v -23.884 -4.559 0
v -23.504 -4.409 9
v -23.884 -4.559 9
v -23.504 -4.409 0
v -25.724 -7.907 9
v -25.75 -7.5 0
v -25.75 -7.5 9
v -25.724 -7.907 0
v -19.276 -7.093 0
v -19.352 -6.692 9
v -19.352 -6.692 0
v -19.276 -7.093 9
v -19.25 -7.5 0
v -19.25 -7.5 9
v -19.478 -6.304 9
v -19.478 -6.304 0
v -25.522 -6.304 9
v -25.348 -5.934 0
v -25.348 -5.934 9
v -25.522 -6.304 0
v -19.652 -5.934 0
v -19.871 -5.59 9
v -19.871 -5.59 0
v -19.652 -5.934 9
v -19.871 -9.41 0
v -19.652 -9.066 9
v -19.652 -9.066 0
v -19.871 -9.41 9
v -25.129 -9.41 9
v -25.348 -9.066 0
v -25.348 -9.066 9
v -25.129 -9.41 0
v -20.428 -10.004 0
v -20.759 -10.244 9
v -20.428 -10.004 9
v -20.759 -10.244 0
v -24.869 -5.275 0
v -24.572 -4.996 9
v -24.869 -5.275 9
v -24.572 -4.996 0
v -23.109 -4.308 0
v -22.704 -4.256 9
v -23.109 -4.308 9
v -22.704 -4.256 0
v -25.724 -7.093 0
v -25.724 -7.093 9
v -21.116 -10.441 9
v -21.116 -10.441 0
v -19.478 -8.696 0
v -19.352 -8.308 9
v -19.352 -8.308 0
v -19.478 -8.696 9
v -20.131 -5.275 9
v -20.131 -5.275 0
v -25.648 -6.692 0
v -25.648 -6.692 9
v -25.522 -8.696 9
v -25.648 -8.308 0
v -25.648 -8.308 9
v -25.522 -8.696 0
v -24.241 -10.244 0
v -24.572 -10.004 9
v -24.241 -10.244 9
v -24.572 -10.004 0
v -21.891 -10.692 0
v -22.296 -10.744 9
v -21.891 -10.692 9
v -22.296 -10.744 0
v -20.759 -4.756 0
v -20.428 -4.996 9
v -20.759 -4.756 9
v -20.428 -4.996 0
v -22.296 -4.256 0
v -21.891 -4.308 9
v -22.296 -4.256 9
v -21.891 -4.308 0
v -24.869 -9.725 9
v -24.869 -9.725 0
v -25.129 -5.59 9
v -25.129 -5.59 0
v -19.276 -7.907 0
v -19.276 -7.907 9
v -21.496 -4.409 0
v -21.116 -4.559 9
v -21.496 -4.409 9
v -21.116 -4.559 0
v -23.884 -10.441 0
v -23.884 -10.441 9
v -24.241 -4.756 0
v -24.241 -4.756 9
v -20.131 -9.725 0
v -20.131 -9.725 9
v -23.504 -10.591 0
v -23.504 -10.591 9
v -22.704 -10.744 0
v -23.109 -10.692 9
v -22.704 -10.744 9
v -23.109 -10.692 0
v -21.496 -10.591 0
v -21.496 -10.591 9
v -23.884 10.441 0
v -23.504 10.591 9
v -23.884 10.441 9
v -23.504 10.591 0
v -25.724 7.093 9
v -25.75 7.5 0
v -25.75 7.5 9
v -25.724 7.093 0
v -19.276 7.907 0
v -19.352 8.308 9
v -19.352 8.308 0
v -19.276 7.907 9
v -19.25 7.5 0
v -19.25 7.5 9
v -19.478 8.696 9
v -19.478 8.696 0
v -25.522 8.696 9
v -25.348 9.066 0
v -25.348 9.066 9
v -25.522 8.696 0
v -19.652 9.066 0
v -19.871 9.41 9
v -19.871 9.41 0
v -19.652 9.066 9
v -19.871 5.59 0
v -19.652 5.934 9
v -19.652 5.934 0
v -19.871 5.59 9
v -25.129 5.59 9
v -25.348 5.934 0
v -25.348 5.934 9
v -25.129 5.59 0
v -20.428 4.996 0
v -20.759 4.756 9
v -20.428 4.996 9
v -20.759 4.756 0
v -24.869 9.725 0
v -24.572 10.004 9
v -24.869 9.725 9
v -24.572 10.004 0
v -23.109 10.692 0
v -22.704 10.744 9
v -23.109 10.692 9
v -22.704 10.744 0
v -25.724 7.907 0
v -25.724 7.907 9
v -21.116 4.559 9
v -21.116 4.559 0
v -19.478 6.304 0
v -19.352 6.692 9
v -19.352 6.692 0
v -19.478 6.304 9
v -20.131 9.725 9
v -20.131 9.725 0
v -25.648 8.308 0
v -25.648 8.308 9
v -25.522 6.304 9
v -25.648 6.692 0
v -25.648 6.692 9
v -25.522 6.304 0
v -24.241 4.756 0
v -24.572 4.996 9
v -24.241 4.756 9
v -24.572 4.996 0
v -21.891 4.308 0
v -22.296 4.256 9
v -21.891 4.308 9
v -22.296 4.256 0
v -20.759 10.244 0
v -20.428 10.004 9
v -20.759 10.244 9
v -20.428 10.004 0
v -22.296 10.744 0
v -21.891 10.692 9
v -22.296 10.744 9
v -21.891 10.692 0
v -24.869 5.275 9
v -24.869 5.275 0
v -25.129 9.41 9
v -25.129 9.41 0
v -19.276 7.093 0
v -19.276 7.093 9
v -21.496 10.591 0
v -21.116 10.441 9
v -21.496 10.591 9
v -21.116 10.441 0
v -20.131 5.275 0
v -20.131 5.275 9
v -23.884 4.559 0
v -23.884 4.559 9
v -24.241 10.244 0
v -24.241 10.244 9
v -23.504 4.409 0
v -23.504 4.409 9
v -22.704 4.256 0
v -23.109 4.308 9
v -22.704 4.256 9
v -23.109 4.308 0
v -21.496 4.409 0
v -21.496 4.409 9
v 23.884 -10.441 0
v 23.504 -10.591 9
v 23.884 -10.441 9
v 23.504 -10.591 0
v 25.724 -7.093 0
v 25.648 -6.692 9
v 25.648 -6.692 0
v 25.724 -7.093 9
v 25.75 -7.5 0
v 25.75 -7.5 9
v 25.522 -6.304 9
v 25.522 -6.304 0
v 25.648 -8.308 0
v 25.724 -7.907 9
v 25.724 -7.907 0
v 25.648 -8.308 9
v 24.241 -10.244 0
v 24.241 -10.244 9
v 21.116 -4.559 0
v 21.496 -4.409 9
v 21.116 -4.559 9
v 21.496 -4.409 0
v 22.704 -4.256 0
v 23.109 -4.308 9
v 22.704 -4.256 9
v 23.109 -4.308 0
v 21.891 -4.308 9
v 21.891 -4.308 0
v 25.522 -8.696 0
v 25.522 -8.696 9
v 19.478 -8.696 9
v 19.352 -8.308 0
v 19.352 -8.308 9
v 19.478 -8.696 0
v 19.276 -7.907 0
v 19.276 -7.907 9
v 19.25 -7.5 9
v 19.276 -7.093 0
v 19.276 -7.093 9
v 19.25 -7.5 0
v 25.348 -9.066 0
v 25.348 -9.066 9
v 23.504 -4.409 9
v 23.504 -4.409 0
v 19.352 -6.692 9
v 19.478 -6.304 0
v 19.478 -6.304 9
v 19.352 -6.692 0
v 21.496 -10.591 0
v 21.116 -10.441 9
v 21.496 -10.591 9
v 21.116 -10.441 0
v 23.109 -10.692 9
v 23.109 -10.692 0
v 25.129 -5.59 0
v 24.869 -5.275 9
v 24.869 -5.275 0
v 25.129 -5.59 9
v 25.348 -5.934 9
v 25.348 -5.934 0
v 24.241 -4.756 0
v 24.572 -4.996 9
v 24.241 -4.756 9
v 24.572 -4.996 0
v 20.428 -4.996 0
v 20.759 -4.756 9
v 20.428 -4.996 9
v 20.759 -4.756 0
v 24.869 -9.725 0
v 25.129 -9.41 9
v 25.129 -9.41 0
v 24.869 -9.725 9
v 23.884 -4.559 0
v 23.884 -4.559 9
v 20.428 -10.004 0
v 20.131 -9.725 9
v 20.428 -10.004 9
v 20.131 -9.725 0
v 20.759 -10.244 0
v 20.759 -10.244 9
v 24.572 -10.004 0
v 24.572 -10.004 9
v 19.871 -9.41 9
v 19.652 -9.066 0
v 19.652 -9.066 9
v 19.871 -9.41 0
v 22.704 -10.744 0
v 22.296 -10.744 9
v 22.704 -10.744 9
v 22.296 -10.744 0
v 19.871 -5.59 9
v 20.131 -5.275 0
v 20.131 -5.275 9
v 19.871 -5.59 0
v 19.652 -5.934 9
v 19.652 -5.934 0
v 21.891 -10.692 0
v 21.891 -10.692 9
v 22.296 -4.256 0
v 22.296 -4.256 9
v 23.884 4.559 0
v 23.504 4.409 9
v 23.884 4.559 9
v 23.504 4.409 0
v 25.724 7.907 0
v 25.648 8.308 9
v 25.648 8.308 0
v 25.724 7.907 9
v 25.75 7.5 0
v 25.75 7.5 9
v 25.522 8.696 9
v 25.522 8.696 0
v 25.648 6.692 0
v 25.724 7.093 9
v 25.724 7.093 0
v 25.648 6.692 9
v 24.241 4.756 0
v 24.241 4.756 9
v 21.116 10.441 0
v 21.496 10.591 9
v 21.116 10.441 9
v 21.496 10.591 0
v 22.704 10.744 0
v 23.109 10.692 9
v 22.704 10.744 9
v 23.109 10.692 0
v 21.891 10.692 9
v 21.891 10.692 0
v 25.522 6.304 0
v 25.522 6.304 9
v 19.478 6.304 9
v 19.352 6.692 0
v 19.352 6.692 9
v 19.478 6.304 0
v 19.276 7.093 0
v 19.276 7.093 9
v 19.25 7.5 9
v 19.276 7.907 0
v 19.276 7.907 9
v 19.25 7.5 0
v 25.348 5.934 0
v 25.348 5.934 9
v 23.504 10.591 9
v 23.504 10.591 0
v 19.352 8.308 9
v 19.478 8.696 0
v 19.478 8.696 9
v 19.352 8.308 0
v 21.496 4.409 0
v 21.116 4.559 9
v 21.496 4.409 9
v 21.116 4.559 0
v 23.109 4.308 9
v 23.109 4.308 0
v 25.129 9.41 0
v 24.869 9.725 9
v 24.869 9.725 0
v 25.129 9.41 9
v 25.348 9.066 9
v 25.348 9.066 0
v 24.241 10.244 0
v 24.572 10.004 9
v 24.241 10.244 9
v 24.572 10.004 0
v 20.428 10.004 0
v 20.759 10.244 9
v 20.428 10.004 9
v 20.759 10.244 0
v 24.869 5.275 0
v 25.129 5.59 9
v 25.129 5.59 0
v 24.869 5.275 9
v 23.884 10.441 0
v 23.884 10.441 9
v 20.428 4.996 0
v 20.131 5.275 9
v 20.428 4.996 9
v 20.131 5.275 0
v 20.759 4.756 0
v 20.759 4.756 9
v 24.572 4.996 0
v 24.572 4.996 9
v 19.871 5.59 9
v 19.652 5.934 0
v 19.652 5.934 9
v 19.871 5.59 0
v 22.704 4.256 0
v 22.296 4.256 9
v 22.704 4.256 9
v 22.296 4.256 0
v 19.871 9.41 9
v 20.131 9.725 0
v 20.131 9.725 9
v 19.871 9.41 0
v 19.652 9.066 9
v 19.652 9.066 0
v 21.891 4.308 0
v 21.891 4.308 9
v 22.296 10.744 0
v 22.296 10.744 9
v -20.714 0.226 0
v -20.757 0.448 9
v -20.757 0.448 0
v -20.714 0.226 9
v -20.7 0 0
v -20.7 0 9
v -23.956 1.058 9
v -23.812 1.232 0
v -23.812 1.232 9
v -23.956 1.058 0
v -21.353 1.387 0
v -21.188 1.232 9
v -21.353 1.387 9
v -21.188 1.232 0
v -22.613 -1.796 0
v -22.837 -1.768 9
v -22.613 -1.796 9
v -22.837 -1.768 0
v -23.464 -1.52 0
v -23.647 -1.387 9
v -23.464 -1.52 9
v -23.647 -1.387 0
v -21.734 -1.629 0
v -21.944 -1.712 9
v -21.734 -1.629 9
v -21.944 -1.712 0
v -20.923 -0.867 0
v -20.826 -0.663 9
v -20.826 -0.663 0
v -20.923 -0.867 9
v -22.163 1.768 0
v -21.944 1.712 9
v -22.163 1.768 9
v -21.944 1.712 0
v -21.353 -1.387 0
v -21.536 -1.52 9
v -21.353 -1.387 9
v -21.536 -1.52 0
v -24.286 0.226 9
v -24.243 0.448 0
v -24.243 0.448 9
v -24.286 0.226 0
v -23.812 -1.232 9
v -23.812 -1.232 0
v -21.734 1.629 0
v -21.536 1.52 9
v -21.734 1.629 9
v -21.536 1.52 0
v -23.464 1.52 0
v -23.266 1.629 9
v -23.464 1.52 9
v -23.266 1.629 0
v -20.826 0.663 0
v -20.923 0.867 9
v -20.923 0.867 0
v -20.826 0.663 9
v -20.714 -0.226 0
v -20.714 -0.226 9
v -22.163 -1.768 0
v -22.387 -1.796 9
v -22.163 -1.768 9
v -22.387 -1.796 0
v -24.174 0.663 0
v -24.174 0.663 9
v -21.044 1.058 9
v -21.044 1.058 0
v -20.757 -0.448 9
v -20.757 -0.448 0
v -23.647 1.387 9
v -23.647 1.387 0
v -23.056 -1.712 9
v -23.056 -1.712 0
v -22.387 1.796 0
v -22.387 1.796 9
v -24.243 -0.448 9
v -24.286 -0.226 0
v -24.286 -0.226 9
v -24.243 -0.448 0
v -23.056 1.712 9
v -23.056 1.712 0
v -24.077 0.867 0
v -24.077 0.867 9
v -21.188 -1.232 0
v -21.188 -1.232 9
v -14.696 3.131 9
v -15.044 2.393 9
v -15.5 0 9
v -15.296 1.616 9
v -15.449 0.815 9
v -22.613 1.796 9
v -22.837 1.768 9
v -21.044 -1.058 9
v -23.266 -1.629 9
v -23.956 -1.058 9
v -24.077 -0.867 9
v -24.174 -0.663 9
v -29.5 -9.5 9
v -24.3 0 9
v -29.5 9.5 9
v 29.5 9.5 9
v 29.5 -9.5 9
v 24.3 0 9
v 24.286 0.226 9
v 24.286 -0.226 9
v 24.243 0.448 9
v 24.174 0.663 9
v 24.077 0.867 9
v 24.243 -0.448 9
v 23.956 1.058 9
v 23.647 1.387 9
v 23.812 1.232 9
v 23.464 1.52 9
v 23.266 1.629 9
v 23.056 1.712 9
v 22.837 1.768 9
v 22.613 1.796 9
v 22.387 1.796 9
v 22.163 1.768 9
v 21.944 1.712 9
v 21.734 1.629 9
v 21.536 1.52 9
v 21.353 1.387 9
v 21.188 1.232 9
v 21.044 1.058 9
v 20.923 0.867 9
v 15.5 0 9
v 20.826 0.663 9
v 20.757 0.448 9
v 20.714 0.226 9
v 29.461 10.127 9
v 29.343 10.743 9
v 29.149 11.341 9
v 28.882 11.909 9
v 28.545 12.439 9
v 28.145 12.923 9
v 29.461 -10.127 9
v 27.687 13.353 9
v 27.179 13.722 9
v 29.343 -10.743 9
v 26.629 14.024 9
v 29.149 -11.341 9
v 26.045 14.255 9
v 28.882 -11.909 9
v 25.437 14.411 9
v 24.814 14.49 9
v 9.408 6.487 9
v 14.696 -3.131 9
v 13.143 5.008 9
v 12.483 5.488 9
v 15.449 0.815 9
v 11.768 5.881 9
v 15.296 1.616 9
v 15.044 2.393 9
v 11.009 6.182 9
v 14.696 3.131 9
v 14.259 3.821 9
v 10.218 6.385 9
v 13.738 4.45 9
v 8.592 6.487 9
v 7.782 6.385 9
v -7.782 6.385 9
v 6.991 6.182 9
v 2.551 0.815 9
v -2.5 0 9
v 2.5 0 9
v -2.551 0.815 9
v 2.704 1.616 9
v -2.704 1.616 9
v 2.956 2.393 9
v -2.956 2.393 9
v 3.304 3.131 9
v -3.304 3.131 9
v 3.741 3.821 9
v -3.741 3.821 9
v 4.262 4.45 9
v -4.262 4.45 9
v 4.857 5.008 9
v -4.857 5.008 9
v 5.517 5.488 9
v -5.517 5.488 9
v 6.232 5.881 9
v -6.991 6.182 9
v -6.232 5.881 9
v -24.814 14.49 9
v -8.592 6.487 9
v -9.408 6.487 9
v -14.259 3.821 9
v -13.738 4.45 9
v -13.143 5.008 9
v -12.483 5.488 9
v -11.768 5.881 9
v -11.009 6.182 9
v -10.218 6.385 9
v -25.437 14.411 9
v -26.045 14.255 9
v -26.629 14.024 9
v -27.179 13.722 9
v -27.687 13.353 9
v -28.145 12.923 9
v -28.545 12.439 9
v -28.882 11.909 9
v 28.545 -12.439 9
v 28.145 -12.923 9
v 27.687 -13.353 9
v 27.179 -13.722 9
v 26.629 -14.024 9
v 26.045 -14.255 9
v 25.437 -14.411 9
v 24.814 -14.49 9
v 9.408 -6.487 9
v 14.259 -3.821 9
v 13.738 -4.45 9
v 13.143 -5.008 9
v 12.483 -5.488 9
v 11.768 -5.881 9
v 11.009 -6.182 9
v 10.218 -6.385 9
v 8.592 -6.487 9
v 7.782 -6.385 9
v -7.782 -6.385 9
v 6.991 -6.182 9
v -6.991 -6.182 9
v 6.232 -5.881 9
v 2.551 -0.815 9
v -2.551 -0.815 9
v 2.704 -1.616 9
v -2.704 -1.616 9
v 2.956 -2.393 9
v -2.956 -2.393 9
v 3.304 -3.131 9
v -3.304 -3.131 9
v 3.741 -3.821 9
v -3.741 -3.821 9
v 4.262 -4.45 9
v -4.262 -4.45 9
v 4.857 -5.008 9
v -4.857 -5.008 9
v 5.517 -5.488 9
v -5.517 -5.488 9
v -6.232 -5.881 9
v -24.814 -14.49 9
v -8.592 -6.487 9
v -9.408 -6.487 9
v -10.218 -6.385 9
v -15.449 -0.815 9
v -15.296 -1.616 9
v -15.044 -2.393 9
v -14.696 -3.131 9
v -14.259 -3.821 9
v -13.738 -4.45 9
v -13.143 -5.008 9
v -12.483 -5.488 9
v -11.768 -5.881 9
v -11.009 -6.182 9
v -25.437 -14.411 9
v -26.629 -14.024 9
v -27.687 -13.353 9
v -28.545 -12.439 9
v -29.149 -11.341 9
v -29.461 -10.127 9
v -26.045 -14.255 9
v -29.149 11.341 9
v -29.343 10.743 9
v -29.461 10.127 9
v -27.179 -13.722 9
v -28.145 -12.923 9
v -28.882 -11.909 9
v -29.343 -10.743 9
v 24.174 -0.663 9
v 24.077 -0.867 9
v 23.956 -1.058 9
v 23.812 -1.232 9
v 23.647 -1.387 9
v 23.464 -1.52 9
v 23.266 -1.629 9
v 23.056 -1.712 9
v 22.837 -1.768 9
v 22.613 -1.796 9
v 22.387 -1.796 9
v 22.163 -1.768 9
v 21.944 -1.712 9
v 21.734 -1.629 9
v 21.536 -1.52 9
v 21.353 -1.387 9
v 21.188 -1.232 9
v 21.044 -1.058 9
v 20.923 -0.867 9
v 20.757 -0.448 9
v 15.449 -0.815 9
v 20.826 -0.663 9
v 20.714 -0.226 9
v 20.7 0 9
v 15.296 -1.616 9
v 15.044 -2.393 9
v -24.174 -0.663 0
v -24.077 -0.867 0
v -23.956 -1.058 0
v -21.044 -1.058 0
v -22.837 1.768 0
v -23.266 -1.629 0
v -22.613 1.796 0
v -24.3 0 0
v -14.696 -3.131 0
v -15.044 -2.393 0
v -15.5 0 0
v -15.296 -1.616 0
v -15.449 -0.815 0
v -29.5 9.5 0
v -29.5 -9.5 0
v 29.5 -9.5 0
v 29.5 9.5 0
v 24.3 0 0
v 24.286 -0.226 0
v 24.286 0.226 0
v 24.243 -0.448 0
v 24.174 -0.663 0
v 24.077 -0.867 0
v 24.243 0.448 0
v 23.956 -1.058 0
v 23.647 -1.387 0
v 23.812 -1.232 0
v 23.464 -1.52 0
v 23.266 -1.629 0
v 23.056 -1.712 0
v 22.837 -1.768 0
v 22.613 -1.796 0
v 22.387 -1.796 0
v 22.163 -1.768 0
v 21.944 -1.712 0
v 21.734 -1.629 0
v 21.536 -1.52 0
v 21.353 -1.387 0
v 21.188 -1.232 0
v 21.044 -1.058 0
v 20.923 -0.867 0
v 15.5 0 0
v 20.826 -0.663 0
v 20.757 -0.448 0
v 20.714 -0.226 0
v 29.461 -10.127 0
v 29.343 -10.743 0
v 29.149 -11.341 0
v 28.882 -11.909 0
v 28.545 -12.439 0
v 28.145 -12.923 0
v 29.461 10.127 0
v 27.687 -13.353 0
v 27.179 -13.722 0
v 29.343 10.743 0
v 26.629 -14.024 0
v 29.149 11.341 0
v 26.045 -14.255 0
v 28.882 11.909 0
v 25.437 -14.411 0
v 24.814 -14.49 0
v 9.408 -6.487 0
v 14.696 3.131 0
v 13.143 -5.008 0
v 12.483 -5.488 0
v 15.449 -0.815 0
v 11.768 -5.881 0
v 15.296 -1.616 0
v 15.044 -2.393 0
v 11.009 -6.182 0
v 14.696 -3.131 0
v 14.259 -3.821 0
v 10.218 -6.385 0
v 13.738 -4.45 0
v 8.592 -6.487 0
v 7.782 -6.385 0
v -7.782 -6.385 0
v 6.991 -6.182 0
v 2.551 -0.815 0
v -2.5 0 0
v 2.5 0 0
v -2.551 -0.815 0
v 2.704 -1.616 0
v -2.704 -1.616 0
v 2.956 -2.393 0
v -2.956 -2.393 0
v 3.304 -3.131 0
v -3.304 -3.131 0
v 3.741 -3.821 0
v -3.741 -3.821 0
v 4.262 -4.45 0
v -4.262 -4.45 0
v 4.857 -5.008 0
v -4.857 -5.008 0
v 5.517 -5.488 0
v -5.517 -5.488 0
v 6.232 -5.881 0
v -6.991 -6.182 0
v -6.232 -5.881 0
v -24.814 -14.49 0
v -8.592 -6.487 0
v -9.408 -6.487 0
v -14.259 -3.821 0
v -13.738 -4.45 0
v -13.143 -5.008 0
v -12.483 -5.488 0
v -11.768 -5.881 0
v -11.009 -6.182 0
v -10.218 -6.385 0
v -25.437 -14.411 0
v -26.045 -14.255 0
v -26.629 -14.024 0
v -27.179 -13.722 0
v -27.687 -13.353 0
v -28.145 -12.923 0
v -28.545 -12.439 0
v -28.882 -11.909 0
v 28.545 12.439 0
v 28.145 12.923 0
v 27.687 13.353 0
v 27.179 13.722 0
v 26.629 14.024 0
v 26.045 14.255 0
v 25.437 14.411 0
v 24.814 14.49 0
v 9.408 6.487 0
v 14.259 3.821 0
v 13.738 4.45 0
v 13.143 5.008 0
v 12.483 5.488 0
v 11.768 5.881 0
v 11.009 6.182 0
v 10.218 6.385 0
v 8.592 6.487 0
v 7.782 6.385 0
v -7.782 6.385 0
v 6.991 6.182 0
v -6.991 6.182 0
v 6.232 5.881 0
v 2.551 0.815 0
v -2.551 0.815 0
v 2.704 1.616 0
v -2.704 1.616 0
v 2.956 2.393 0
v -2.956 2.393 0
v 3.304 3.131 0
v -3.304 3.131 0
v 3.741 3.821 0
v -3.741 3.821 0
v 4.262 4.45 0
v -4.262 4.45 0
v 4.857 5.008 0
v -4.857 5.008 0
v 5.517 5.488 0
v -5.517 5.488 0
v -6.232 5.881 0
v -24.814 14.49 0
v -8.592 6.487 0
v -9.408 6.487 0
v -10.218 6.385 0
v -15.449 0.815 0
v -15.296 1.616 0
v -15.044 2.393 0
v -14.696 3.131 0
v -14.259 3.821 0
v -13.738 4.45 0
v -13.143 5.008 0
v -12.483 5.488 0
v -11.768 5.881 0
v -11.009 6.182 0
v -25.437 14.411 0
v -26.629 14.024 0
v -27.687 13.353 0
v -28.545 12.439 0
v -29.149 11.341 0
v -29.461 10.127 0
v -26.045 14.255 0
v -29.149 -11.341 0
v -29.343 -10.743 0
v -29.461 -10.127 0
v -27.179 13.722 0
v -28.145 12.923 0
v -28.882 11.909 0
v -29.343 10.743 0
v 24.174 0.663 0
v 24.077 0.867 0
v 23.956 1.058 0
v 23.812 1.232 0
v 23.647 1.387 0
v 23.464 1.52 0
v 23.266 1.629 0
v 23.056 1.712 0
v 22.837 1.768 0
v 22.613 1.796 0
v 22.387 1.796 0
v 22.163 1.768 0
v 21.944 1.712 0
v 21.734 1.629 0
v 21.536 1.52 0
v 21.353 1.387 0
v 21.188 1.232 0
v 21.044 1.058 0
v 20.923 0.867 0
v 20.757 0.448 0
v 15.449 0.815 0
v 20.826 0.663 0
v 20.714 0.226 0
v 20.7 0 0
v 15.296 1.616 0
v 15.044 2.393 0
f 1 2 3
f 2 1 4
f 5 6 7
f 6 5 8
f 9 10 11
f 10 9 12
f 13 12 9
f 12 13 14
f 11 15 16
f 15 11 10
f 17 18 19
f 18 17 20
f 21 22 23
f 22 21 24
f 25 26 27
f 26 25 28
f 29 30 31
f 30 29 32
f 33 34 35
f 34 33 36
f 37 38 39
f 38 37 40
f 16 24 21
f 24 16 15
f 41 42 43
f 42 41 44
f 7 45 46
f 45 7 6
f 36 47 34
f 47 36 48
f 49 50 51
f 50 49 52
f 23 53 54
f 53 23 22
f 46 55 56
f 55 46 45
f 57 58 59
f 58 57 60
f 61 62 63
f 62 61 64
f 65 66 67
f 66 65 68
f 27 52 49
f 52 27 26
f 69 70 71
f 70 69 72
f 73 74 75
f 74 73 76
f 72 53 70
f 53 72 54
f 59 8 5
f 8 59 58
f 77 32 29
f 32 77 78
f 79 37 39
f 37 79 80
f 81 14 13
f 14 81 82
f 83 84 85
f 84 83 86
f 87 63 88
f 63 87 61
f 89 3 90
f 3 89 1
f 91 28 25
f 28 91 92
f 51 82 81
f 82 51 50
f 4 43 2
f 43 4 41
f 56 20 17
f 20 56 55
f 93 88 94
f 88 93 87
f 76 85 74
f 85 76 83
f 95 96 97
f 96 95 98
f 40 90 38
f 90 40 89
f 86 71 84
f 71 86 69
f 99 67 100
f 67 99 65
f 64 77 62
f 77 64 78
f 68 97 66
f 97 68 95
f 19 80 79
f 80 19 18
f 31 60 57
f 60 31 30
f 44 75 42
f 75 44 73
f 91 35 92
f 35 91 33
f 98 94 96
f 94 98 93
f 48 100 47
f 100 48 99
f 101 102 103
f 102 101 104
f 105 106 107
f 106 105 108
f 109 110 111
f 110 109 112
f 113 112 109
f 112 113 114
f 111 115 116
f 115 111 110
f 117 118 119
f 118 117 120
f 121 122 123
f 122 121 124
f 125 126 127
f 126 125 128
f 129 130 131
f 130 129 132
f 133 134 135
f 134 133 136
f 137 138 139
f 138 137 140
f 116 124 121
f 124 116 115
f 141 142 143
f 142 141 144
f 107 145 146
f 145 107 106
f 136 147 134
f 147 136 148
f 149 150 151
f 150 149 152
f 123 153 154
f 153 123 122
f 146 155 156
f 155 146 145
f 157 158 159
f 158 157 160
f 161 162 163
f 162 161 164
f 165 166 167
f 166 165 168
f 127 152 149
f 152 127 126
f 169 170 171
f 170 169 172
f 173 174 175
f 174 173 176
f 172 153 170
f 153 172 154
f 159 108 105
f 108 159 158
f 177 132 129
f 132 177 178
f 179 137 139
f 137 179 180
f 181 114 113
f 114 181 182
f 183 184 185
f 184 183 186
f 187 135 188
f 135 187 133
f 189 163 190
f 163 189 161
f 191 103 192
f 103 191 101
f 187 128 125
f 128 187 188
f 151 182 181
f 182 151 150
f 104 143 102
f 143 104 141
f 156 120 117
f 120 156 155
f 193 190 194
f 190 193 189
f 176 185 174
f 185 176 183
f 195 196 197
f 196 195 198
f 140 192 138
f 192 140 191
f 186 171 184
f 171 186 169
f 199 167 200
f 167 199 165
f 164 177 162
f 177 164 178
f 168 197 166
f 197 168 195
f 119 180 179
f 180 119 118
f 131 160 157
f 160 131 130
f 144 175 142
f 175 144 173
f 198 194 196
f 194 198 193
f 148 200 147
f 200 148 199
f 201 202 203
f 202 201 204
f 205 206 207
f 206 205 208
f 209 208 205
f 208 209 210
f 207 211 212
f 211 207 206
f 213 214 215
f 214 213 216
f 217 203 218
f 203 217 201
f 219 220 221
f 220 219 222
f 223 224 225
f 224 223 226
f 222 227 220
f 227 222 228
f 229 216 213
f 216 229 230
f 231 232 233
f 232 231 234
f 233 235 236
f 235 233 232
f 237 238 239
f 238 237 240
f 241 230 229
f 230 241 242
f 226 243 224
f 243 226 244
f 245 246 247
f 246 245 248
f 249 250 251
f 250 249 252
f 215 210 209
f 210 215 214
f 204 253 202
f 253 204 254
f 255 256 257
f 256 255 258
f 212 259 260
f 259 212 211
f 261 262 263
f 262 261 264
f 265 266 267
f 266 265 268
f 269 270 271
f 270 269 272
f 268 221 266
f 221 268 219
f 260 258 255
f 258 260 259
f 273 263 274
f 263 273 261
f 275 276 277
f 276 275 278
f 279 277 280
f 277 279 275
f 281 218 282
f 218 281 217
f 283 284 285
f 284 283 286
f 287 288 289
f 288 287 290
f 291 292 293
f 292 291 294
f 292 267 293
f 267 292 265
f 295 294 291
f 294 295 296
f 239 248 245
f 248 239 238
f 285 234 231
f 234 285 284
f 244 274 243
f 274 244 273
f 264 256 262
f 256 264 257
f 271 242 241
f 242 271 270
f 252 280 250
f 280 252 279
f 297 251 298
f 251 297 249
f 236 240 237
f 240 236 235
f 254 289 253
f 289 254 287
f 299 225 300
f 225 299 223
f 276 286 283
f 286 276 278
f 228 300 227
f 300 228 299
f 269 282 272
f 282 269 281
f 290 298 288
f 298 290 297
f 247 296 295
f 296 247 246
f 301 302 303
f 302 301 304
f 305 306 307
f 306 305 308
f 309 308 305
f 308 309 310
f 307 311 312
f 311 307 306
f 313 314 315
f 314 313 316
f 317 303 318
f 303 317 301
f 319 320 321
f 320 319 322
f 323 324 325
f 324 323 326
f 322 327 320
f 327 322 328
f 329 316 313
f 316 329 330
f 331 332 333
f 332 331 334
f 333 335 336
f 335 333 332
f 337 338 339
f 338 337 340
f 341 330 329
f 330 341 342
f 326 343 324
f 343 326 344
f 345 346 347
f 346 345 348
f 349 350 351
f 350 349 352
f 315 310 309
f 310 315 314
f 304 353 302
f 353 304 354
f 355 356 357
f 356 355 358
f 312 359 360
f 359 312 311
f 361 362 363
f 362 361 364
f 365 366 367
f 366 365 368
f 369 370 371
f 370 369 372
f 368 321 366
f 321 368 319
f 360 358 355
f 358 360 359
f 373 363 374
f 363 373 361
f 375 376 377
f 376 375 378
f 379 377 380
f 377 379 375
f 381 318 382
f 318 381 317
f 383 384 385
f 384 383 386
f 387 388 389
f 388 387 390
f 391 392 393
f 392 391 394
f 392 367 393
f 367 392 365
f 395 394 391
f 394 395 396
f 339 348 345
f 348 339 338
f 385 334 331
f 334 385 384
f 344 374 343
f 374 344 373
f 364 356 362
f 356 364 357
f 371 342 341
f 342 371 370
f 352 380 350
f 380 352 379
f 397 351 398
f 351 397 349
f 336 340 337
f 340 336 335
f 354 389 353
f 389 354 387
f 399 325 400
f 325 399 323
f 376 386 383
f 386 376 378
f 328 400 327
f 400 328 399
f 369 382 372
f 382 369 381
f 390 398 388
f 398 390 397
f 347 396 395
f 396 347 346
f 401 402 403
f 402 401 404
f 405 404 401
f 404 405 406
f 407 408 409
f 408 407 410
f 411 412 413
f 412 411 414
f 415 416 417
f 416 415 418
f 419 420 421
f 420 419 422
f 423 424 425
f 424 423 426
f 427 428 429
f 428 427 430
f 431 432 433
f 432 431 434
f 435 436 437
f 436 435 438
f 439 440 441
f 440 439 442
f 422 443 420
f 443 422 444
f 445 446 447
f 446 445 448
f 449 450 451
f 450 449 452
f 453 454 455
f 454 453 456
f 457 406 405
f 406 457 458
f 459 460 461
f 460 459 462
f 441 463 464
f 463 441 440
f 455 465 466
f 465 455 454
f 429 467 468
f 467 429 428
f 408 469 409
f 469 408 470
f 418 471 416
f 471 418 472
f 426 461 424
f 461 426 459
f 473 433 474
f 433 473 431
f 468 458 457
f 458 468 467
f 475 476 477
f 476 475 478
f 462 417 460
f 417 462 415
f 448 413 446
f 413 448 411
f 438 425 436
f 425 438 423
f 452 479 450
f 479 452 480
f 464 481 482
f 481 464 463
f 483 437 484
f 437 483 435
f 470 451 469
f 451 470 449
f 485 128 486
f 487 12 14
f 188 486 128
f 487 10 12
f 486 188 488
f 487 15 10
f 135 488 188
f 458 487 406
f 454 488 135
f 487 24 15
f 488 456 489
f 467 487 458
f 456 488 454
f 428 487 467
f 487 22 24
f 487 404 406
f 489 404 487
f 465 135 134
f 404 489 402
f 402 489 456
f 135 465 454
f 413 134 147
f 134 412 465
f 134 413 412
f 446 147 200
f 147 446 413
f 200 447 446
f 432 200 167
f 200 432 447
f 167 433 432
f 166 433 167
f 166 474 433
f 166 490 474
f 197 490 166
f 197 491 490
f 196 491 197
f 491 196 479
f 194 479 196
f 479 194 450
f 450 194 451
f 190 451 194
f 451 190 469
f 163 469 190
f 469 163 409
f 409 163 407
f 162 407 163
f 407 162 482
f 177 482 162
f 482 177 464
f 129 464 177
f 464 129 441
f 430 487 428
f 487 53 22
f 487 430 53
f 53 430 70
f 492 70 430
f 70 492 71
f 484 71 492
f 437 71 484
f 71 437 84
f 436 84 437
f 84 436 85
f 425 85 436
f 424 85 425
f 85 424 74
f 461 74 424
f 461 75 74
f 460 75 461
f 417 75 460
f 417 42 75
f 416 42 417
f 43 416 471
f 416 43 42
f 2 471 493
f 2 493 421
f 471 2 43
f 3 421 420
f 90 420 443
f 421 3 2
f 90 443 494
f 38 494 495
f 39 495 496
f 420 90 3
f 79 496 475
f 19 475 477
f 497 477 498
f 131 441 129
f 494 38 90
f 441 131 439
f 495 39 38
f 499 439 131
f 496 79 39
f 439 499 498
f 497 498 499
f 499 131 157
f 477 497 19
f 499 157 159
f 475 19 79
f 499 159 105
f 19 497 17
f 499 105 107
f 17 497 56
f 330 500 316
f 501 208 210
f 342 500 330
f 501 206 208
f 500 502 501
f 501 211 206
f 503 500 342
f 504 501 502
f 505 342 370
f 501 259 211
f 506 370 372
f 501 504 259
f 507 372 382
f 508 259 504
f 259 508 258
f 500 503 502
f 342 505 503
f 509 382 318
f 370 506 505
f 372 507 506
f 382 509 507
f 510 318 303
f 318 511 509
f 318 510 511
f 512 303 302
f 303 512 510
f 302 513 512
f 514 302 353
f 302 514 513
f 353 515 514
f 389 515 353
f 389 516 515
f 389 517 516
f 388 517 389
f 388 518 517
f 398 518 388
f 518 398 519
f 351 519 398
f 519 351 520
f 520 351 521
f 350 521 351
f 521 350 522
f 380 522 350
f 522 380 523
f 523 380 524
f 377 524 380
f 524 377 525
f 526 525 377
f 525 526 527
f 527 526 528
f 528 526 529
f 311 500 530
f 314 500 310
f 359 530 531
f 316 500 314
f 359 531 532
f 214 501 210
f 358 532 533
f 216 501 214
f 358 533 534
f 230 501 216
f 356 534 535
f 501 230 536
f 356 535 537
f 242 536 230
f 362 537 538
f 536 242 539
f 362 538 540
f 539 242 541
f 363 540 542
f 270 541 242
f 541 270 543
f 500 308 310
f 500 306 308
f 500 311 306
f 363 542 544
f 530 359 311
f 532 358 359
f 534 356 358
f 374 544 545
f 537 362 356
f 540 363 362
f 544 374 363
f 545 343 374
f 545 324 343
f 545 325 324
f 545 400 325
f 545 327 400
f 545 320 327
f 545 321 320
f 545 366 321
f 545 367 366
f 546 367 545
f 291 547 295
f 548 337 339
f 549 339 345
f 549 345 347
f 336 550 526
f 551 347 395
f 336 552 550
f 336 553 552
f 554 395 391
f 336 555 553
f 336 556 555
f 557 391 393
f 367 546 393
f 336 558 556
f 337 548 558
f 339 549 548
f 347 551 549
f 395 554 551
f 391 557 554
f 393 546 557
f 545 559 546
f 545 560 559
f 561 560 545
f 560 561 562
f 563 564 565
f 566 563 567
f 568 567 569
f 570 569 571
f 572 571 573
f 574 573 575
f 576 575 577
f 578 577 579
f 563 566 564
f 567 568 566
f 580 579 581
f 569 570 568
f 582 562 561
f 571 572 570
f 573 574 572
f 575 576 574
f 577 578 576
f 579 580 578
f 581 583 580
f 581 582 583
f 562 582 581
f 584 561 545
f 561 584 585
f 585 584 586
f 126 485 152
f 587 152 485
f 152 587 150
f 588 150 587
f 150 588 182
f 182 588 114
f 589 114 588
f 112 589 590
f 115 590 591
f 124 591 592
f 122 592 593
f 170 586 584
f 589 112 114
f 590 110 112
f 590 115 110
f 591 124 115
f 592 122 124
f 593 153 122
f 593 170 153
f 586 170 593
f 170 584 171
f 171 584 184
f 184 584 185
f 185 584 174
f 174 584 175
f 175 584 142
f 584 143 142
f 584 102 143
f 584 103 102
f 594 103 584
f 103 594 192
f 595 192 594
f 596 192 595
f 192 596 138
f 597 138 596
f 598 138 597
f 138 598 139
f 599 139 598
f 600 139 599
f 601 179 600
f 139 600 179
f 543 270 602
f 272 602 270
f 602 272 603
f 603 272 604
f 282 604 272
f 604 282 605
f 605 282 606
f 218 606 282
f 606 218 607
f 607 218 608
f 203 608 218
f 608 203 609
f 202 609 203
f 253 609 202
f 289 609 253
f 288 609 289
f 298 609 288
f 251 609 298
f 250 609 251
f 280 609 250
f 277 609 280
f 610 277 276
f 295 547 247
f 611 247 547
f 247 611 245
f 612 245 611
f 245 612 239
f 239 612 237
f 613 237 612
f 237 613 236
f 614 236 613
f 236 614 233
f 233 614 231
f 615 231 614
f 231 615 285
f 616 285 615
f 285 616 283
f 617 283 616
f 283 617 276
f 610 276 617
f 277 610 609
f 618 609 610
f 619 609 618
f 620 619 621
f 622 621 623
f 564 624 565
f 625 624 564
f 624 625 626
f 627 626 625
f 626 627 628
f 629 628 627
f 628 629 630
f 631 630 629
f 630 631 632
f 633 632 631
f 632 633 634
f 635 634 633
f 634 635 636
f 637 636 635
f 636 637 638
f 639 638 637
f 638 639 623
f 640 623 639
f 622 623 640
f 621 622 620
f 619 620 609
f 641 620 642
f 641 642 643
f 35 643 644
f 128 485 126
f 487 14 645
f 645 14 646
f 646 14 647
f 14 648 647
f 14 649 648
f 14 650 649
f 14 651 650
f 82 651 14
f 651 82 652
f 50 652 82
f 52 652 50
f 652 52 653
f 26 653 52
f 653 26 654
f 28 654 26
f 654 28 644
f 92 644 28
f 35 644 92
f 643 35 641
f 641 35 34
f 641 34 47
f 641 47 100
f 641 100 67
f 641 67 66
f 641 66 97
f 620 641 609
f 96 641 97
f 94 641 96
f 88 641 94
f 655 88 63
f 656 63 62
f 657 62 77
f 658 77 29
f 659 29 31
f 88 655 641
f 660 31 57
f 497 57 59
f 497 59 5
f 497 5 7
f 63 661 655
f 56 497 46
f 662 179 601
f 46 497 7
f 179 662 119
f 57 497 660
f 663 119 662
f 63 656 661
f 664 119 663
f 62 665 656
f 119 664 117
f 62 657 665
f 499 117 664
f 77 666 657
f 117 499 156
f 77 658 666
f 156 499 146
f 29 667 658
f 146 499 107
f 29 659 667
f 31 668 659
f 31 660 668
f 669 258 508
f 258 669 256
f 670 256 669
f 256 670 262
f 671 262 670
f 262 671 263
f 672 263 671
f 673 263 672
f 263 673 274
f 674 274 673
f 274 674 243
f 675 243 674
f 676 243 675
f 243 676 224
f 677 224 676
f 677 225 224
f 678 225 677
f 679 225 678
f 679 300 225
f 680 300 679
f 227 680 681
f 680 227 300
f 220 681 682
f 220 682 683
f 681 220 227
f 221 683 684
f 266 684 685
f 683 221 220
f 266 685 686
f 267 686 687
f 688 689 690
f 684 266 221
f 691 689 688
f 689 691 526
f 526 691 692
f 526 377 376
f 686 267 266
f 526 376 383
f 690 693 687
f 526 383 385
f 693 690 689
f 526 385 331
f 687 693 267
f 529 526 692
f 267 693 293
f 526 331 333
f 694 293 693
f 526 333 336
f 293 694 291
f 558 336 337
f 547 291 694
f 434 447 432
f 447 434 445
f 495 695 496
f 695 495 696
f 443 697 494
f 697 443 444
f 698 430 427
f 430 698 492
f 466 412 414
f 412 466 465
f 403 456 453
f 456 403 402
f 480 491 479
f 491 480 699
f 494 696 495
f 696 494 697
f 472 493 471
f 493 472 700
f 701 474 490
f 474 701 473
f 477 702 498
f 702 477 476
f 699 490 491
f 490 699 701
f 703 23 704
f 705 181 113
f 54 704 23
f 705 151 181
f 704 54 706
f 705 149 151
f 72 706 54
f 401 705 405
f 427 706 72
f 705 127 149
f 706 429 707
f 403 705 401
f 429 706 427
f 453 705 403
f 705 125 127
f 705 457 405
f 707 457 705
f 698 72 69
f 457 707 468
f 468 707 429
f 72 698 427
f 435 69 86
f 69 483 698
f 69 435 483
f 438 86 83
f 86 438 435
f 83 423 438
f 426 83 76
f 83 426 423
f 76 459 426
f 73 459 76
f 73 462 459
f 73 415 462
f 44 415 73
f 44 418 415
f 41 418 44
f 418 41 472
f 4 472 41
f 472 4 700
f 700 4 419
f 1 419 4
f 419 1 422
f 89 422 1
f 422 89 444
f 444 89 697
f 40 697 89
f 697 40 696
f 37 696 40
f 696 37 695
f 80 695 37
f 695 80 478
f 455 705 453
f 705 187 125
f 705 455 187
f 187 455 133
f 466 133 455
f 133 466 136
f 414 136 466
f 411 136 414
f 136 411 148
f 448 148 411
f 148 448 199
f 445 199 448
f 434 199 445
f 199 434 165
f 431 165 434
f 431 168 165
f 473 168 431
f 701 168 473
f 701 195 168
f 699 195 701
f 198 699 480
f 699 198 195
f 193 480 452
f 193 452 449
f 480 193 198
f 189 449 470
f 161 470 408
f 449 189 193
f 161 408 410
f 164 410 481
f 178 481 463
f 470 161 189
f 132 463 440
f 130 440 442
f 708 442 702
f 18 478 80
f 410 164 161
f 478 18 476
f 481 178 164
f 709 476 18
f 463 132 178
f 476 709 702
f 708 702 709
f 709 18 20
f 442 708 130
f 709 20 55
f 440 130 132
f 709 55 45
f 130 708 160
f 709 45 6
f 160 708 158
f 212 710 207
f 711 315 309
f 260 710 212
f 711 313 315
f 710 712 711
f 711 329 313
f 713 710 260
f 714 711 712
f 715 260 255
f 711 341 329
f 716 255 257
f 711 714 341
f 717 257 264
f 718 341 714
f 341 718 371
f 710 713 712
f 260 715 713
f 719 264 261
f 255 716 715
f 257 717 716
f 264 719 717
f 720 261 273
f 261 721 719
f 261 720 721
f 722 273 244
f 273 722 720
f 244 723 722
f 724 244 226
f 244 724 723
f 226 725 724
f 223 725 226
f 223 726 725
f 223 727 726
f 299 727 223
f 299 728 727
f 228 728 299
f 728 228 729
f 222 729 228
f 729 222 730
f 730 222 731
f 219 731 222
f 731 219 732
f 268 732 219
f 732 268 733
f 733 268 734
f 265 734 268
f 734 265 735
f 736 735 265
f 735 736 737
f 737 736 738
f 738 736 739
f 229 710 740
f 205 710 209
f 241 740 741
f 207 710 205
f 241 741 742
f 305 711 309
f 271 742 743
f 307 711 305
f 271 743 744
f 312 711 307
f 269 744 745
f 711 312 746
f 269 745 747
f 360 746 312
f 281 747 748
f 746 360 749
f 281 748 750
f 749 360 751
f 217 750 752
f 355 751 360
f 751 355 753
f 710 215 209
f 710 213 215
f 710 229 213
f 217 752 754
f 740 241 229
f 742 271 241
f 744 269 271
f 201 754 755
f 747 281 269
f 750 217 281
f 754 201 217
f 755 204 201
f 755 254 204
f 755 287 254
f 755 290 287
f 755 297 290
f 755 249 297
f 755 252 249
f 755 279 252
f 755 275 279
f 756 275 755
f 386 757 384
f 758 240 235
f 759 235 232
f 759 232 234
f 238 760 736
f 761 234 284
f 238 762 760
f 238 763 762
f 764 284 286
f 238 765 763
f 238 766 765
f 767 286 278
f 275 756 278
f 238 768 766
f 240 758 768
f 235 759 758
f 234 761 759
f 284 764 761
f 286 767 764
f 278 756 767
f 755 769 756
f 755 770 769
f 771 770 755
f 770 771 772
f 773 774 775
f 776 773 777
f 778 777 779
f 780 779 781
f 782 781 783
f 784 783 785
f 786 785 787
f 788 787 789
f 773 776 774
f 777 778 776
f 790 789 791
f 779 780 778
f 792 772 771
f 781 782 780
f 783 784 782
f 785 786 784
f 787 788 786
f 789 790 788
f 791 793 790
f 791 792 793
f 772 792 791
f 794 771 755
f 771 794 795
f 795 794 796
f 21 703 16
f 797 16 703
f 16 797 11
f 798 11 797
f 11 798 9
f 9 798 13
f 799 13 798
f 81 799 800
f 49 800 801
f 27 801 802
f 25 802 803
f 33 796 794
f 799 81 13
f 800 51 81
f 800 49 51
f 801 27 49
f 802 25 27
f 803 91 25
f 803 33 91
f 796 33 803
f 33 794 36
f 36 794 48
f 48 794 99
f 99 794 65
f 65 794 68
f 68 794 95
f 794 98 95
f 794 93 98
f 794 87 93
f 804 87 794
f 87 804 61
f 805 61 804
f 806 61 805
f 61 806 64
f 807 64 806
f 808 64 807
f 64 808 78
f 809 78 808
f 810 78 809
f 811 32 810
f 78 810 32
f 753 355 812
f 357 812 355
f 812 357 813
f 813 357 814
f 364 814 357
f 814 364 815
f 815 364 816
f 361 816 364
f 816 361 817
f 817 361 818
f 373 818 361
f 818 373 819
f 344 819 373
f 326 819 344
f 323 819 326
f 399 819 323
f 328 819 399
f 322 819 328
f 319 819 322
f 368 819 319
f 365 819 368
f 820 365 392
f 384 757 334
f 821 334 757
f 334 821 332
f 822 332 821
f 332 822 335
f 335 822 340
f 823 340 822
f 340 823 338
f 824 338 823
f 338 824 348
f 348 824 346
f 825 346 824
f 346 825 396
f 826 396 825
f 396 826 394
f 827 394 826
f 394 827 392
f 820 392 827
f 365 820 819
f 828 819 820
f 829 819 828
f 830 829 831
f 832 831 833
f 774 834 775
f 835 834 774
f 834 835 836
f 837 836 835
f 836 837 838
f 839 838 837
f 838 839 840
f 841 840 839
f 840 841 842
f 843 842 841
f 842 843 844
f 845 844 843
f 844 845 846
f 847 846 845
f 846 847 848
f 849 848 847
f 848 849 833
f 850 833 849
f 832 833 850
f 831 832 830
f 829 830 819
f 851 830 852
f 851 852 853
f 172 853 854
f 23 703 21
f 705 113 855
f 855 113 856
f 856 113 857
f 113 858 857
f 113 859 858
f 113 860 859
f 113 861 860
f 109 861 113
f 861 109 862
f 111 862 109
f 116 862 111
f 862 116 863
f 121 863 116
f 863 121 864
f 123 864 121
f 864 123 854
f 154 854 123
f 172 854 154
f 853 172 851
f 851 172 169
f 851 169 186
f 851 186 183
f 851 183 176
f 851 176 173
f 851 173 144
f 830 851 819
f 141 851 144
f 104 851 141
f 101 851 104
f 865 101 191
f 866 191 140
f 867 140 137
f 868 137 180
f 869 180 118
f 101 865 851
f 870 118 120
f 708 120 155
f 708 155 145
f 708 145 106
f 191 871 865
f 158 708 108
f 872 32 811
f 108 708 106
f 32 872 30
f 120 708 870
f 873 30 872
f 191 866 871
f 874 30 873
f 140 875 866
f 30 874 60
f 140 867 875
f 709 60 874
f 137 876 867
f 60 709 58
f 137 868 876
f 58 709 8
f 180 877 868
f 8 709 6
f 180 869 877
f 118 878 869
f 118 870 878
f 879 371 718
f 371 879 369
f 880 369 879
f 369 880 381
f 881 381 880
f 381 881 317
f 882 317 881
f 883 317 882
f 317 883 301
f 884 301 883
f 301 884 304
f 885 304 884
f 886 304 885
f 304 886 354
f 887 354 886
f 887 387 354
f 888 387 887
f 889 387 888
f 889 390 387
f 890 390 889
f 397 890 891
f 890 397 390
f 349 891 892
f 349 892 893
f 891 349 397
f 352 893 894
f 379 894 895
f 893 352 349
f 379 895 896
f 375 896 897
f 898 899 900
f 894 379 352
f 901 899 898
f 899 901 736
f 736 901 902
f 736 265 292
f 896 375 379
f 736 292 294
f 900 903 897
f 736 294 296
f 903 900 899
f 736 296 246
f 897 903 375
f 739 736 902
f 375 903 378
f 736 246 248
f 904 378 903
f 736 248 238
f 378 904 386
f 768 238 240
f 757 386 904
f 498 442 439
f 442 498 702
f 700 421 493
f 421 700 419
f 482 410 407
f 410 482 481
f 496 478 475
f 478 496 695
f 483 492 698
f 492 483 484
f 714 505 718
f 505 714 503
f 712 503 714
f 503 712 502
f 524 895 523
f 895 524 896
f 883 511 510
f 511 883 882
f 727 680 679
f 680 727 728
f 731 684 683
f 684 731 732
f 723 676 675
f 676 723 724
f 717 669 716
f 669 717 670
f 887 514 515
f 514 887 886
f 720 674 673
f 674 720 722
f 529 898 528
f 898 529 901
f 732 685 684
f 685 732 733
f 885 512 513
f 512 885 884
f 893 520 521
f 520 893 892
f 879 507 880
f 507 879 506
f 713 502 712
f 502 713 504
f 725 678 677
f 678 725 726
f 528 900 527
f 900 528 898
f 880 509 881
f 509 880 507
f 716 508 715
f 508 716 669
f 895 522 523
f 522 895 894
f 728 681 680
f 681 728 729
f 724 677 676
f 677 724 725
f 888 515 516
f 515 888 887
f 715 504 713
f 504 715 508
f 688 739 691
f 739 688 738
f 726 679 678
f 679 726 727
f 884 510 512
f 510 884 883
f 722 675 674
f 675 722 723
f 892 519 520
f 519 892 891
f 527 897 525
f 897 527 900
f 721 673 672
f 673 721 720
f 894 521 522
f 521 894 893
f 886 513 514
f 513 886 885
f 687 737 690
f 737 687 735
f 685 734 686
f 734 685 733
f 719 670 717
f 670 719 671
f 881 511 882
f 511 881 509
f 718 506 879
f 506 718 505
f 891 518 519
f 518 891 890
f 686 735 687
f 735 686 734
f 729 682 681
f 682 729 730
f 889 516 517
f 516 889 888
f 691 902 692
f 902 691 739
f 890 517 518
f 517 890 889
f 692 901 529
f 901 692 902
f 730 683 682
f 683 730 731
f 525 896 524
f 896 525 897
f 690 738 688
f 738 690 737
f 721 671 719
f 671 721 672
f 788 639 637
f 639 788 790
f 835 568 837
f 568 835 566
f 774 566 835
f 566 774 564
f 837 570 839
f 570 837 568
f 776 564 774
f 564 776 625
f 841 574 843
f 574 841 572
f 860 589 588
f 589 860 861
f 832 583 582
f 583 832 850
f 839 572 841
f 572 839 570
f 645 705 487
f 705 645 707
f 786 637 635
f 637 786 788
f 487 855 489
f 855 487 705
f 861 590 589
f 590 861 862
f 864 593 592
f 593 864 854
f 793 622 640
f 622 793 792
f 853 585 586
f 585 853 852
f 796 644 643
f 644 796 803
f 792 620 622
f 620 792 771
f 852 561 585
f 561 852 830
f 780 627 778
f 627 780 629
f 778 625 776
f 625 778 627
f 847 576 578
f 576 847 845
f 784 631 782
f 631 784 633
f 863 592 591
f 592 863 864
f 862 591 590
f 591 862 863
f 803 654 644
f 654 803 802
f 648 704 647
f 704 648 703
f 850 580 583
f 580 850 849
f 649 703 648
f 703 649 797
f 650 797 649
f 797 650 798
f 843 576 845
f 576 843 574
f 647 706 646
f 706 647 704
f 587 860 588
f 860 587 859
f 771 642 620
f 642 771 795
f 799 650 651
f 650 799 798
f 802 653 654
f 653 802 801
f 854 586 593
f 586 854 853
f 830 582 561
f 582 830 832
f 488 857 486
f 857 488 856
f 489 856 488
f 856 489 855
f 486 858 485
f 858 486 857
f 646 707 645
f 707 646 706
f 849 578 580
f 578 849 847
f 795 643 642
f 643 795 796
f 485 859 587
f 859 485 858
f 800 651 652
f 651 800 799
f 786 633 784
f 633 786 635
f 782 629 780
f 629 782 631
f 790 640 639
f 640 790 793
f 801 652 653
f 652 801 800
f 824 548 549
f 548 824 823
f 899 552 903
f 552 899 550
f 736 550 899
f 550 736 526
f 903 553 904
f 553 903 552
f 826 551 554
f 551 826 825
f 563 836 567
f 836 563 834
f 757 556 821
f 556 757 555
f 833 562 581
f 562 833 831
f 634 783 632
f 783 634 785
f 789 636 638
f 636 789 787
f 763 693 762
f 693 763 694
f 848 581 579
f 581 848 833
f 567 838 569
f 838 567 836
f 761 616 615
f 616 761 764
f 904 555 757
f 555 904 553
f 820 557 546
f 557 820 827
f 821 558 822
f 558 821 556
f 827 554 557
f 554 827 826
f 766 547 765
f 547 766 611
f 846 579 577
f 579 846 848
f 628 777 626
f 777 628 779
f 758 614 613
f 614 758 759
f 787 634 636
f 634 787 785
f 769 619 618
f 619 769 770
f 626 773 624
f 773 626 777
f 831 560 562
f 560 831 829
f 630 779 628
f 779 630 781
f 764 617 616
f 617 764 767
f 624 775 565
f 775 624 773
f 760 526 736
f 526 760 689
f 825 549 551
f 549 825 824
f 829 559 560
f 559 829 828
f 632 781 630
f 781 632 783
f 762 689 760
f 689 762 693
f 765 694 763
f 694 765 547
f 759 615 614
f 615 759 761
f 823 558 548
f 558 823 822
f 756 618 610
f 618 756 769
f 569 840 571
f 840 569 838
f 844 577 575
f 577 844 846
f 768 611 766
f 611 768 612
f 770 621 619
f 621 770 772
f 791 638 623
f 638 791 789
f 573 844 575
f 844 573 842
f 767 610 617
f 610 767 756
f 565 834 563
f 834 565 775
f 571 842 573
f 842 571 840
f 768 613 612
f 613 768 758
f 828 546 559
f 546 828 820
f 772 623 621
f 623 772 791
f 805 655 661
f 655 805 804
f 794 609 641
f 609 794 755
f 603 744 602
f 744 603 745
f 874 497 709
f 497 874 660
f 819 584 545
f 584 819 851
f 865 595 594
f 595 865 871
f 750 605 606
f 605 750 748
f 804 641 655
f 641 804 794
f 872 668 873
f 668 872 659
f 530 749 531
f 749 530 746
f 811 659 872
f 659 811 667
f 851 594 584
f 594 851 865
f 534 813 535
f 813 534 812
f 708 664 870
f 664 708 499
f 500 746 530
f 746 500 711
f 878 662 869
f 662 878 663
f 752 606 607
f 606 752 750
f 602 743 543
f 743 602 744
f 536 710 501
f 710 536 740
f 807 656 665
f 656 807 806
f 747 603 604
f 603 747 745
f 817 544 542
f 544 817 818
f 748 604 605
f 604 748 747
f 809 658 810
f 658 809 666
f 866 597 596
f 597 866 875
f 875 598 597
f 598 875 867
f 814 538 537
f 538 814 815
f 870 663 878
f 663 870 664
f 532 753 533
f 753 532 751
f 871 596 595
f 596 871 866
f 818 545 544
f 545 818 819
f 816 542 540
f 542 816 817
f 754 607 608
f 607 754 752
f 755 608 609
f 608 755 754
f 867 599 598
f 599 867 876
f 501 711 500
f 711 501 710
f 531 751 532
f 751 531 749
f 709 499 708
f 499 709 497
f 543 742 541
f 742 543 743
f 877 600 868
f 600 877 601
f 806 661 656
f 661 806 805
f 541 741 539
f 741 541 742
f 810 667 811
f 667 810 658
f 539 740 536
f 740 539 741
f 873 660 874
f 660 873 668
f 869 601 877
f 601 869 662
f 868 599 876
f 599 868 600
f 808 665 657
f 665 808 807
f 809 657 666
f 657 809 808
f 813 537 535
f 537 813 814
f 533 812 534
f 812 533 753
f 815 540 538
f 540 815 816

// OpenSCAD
$fn = 50;


difference() {
	union() {
		hull() {
			translate(v = [-24.5000000000, 9.5000000000, 0]) {
				cylinder(h = 9, r = 5);
			}
			translate(v = [24.5000000000, 9.5000000000, 0]) {
				cylinder(h = 9, r = 5);
			}
			translate(v = [-24.5000000000, -9.5000000000, 0]) {
				cylinder(h = 9, r = 5);
			}
			translate(v = [24.5000000000, -9.5000000000, 0]) {
				cylinder(h = 9, r = 5);
			}
		}
	}
	union() {
		#translate(v = [-22.5000000000, -7.5000000000, 0]) {
			cylinder(h = 9, r = 3.2500000000);
		}
		#translate(v = [-22.5000000000, 7.5000000000, 0]) {
			cylinder(h = 9, r = 3.2500000000);
		}
		#translate(v = [22.5000000000, -7.5000000000, 0]) {
			cylinder(h = 9, r = 3.2500000000);
		}
		#translate(v = [22.5000000000, 7.5000000000, 0]) {
			cylinder(h = 9, r = 3.2500000000);
		}
		#translate(v = [-22.5000000000, -7.5000000000, -100.0000000000]) {
			cylinder(h = 200, r = 3.2500000000);
		}
		#translate(v = [-22.5000000000, 7.5000000000, -100.0000000000]) {
			cylinder(h = 200, r = 3.2500000000);
		}
		#translate(v = [22.5000000000, -7.5000000000, -100.0000000000]) {
			cylinder(h = 200, r = 3.2500000000);
		}
		#translate(v = [22.5000000000, 7.5000000000, -100.0000000000]) {
			cylinder(h = 200, r = 3.2500000000);
		}
		#translate(v = [-22.5000000000, -7.5000000000, 0]) {
			cylinder(h = 9, r = 1.8000000000);
		}
		#translate(v = [-22.5000000000, 0.0000000000, 0]) {
			cylinder(h = 9, r = 1.8000000000);
		}
		#translate(v = [-22.5000000000, 7.5000000000, 0]) {
			cylinder(h = 9, r = 1.8000000000);
		}
		#translate(v = [22.5000000000, -7.5000000000, 0]) {
			cylinder(h = 9, r = 1.8000000000);
		}
		#translate(v = [22.5000000000, 0.0000000000, 0]) {
			cylinder(h = 9, r = 1.8000000000);
		}
		#translate(v = [22.5000000000, 7.5000000000, 0]) {
			cylinder(h = 9, r = 1.8000000000);
		}
		#translate(v = [-22.5000000000, -7.5000000000, 0]) {
			cylinder(h = 9, r = 1.8000000000);
		}
		#translate(v = [-22.5000000000, 0.0000000000, 0]) {
			cylinder(h = 9, r = 1.8000000000);
		}
		#translate(v = [-22.5000000000, 7.5000000000, 0]) {
			cylinder(h = 9, r = 1.8000000000);
		}
		#translate(v = [22.5000000000, -7.5000000000, 0]) {
			cylinder(h = 9, r = 1.8000000000);
		}
		#translate(v = [22.5000000000, 0.0000000000, 0]) {
			cylinder(h = 9, r = 1.8000000000);
		}
		#translate(v = [22.5000000000, 7.5000000000, 0]) {
			cylinder(h = 9, r = 1.8000000000);
		}
		#translate(v = [-22.5000000000, -7.5000000000, 0]) {
			cylinder(h = 9, r = 1.8000000000);
		}
		#translate(v = [-22.5000000000, 0.0000000000, 0]) {
			cylinder(h = 9, r = 1.8000000000);
		}
		#translate(v = [-22.5000000000, 7.5000000000, 0]) {
			cylinder(h = 9, r = 1.8000000000);
		}
		#translate(v = [22.5000000000, -7.5000000000, 0]) {
			cylinder(h = 9, r = 1.8000000000);
		}
		#translate(v = [22.5000000000, 0.0000000000, 0]) {
			cylinder(h = 9, r = 1.8000000000);
		}
		#translate(v = [22.5000000000, 7.5000000000, 0]) {
			cylinder(h = 9, r = 1.8000000000);
		}
		#translate(v = [-9.0000000000, 0, 0]) {
			cylinder(h = 9, r = 6.5000000000);
		}
		#translate(v = [9.0000000000, 0, 0]) {
			cylinder(h = 9, r = 6.5000000000);
		}
	}
}
